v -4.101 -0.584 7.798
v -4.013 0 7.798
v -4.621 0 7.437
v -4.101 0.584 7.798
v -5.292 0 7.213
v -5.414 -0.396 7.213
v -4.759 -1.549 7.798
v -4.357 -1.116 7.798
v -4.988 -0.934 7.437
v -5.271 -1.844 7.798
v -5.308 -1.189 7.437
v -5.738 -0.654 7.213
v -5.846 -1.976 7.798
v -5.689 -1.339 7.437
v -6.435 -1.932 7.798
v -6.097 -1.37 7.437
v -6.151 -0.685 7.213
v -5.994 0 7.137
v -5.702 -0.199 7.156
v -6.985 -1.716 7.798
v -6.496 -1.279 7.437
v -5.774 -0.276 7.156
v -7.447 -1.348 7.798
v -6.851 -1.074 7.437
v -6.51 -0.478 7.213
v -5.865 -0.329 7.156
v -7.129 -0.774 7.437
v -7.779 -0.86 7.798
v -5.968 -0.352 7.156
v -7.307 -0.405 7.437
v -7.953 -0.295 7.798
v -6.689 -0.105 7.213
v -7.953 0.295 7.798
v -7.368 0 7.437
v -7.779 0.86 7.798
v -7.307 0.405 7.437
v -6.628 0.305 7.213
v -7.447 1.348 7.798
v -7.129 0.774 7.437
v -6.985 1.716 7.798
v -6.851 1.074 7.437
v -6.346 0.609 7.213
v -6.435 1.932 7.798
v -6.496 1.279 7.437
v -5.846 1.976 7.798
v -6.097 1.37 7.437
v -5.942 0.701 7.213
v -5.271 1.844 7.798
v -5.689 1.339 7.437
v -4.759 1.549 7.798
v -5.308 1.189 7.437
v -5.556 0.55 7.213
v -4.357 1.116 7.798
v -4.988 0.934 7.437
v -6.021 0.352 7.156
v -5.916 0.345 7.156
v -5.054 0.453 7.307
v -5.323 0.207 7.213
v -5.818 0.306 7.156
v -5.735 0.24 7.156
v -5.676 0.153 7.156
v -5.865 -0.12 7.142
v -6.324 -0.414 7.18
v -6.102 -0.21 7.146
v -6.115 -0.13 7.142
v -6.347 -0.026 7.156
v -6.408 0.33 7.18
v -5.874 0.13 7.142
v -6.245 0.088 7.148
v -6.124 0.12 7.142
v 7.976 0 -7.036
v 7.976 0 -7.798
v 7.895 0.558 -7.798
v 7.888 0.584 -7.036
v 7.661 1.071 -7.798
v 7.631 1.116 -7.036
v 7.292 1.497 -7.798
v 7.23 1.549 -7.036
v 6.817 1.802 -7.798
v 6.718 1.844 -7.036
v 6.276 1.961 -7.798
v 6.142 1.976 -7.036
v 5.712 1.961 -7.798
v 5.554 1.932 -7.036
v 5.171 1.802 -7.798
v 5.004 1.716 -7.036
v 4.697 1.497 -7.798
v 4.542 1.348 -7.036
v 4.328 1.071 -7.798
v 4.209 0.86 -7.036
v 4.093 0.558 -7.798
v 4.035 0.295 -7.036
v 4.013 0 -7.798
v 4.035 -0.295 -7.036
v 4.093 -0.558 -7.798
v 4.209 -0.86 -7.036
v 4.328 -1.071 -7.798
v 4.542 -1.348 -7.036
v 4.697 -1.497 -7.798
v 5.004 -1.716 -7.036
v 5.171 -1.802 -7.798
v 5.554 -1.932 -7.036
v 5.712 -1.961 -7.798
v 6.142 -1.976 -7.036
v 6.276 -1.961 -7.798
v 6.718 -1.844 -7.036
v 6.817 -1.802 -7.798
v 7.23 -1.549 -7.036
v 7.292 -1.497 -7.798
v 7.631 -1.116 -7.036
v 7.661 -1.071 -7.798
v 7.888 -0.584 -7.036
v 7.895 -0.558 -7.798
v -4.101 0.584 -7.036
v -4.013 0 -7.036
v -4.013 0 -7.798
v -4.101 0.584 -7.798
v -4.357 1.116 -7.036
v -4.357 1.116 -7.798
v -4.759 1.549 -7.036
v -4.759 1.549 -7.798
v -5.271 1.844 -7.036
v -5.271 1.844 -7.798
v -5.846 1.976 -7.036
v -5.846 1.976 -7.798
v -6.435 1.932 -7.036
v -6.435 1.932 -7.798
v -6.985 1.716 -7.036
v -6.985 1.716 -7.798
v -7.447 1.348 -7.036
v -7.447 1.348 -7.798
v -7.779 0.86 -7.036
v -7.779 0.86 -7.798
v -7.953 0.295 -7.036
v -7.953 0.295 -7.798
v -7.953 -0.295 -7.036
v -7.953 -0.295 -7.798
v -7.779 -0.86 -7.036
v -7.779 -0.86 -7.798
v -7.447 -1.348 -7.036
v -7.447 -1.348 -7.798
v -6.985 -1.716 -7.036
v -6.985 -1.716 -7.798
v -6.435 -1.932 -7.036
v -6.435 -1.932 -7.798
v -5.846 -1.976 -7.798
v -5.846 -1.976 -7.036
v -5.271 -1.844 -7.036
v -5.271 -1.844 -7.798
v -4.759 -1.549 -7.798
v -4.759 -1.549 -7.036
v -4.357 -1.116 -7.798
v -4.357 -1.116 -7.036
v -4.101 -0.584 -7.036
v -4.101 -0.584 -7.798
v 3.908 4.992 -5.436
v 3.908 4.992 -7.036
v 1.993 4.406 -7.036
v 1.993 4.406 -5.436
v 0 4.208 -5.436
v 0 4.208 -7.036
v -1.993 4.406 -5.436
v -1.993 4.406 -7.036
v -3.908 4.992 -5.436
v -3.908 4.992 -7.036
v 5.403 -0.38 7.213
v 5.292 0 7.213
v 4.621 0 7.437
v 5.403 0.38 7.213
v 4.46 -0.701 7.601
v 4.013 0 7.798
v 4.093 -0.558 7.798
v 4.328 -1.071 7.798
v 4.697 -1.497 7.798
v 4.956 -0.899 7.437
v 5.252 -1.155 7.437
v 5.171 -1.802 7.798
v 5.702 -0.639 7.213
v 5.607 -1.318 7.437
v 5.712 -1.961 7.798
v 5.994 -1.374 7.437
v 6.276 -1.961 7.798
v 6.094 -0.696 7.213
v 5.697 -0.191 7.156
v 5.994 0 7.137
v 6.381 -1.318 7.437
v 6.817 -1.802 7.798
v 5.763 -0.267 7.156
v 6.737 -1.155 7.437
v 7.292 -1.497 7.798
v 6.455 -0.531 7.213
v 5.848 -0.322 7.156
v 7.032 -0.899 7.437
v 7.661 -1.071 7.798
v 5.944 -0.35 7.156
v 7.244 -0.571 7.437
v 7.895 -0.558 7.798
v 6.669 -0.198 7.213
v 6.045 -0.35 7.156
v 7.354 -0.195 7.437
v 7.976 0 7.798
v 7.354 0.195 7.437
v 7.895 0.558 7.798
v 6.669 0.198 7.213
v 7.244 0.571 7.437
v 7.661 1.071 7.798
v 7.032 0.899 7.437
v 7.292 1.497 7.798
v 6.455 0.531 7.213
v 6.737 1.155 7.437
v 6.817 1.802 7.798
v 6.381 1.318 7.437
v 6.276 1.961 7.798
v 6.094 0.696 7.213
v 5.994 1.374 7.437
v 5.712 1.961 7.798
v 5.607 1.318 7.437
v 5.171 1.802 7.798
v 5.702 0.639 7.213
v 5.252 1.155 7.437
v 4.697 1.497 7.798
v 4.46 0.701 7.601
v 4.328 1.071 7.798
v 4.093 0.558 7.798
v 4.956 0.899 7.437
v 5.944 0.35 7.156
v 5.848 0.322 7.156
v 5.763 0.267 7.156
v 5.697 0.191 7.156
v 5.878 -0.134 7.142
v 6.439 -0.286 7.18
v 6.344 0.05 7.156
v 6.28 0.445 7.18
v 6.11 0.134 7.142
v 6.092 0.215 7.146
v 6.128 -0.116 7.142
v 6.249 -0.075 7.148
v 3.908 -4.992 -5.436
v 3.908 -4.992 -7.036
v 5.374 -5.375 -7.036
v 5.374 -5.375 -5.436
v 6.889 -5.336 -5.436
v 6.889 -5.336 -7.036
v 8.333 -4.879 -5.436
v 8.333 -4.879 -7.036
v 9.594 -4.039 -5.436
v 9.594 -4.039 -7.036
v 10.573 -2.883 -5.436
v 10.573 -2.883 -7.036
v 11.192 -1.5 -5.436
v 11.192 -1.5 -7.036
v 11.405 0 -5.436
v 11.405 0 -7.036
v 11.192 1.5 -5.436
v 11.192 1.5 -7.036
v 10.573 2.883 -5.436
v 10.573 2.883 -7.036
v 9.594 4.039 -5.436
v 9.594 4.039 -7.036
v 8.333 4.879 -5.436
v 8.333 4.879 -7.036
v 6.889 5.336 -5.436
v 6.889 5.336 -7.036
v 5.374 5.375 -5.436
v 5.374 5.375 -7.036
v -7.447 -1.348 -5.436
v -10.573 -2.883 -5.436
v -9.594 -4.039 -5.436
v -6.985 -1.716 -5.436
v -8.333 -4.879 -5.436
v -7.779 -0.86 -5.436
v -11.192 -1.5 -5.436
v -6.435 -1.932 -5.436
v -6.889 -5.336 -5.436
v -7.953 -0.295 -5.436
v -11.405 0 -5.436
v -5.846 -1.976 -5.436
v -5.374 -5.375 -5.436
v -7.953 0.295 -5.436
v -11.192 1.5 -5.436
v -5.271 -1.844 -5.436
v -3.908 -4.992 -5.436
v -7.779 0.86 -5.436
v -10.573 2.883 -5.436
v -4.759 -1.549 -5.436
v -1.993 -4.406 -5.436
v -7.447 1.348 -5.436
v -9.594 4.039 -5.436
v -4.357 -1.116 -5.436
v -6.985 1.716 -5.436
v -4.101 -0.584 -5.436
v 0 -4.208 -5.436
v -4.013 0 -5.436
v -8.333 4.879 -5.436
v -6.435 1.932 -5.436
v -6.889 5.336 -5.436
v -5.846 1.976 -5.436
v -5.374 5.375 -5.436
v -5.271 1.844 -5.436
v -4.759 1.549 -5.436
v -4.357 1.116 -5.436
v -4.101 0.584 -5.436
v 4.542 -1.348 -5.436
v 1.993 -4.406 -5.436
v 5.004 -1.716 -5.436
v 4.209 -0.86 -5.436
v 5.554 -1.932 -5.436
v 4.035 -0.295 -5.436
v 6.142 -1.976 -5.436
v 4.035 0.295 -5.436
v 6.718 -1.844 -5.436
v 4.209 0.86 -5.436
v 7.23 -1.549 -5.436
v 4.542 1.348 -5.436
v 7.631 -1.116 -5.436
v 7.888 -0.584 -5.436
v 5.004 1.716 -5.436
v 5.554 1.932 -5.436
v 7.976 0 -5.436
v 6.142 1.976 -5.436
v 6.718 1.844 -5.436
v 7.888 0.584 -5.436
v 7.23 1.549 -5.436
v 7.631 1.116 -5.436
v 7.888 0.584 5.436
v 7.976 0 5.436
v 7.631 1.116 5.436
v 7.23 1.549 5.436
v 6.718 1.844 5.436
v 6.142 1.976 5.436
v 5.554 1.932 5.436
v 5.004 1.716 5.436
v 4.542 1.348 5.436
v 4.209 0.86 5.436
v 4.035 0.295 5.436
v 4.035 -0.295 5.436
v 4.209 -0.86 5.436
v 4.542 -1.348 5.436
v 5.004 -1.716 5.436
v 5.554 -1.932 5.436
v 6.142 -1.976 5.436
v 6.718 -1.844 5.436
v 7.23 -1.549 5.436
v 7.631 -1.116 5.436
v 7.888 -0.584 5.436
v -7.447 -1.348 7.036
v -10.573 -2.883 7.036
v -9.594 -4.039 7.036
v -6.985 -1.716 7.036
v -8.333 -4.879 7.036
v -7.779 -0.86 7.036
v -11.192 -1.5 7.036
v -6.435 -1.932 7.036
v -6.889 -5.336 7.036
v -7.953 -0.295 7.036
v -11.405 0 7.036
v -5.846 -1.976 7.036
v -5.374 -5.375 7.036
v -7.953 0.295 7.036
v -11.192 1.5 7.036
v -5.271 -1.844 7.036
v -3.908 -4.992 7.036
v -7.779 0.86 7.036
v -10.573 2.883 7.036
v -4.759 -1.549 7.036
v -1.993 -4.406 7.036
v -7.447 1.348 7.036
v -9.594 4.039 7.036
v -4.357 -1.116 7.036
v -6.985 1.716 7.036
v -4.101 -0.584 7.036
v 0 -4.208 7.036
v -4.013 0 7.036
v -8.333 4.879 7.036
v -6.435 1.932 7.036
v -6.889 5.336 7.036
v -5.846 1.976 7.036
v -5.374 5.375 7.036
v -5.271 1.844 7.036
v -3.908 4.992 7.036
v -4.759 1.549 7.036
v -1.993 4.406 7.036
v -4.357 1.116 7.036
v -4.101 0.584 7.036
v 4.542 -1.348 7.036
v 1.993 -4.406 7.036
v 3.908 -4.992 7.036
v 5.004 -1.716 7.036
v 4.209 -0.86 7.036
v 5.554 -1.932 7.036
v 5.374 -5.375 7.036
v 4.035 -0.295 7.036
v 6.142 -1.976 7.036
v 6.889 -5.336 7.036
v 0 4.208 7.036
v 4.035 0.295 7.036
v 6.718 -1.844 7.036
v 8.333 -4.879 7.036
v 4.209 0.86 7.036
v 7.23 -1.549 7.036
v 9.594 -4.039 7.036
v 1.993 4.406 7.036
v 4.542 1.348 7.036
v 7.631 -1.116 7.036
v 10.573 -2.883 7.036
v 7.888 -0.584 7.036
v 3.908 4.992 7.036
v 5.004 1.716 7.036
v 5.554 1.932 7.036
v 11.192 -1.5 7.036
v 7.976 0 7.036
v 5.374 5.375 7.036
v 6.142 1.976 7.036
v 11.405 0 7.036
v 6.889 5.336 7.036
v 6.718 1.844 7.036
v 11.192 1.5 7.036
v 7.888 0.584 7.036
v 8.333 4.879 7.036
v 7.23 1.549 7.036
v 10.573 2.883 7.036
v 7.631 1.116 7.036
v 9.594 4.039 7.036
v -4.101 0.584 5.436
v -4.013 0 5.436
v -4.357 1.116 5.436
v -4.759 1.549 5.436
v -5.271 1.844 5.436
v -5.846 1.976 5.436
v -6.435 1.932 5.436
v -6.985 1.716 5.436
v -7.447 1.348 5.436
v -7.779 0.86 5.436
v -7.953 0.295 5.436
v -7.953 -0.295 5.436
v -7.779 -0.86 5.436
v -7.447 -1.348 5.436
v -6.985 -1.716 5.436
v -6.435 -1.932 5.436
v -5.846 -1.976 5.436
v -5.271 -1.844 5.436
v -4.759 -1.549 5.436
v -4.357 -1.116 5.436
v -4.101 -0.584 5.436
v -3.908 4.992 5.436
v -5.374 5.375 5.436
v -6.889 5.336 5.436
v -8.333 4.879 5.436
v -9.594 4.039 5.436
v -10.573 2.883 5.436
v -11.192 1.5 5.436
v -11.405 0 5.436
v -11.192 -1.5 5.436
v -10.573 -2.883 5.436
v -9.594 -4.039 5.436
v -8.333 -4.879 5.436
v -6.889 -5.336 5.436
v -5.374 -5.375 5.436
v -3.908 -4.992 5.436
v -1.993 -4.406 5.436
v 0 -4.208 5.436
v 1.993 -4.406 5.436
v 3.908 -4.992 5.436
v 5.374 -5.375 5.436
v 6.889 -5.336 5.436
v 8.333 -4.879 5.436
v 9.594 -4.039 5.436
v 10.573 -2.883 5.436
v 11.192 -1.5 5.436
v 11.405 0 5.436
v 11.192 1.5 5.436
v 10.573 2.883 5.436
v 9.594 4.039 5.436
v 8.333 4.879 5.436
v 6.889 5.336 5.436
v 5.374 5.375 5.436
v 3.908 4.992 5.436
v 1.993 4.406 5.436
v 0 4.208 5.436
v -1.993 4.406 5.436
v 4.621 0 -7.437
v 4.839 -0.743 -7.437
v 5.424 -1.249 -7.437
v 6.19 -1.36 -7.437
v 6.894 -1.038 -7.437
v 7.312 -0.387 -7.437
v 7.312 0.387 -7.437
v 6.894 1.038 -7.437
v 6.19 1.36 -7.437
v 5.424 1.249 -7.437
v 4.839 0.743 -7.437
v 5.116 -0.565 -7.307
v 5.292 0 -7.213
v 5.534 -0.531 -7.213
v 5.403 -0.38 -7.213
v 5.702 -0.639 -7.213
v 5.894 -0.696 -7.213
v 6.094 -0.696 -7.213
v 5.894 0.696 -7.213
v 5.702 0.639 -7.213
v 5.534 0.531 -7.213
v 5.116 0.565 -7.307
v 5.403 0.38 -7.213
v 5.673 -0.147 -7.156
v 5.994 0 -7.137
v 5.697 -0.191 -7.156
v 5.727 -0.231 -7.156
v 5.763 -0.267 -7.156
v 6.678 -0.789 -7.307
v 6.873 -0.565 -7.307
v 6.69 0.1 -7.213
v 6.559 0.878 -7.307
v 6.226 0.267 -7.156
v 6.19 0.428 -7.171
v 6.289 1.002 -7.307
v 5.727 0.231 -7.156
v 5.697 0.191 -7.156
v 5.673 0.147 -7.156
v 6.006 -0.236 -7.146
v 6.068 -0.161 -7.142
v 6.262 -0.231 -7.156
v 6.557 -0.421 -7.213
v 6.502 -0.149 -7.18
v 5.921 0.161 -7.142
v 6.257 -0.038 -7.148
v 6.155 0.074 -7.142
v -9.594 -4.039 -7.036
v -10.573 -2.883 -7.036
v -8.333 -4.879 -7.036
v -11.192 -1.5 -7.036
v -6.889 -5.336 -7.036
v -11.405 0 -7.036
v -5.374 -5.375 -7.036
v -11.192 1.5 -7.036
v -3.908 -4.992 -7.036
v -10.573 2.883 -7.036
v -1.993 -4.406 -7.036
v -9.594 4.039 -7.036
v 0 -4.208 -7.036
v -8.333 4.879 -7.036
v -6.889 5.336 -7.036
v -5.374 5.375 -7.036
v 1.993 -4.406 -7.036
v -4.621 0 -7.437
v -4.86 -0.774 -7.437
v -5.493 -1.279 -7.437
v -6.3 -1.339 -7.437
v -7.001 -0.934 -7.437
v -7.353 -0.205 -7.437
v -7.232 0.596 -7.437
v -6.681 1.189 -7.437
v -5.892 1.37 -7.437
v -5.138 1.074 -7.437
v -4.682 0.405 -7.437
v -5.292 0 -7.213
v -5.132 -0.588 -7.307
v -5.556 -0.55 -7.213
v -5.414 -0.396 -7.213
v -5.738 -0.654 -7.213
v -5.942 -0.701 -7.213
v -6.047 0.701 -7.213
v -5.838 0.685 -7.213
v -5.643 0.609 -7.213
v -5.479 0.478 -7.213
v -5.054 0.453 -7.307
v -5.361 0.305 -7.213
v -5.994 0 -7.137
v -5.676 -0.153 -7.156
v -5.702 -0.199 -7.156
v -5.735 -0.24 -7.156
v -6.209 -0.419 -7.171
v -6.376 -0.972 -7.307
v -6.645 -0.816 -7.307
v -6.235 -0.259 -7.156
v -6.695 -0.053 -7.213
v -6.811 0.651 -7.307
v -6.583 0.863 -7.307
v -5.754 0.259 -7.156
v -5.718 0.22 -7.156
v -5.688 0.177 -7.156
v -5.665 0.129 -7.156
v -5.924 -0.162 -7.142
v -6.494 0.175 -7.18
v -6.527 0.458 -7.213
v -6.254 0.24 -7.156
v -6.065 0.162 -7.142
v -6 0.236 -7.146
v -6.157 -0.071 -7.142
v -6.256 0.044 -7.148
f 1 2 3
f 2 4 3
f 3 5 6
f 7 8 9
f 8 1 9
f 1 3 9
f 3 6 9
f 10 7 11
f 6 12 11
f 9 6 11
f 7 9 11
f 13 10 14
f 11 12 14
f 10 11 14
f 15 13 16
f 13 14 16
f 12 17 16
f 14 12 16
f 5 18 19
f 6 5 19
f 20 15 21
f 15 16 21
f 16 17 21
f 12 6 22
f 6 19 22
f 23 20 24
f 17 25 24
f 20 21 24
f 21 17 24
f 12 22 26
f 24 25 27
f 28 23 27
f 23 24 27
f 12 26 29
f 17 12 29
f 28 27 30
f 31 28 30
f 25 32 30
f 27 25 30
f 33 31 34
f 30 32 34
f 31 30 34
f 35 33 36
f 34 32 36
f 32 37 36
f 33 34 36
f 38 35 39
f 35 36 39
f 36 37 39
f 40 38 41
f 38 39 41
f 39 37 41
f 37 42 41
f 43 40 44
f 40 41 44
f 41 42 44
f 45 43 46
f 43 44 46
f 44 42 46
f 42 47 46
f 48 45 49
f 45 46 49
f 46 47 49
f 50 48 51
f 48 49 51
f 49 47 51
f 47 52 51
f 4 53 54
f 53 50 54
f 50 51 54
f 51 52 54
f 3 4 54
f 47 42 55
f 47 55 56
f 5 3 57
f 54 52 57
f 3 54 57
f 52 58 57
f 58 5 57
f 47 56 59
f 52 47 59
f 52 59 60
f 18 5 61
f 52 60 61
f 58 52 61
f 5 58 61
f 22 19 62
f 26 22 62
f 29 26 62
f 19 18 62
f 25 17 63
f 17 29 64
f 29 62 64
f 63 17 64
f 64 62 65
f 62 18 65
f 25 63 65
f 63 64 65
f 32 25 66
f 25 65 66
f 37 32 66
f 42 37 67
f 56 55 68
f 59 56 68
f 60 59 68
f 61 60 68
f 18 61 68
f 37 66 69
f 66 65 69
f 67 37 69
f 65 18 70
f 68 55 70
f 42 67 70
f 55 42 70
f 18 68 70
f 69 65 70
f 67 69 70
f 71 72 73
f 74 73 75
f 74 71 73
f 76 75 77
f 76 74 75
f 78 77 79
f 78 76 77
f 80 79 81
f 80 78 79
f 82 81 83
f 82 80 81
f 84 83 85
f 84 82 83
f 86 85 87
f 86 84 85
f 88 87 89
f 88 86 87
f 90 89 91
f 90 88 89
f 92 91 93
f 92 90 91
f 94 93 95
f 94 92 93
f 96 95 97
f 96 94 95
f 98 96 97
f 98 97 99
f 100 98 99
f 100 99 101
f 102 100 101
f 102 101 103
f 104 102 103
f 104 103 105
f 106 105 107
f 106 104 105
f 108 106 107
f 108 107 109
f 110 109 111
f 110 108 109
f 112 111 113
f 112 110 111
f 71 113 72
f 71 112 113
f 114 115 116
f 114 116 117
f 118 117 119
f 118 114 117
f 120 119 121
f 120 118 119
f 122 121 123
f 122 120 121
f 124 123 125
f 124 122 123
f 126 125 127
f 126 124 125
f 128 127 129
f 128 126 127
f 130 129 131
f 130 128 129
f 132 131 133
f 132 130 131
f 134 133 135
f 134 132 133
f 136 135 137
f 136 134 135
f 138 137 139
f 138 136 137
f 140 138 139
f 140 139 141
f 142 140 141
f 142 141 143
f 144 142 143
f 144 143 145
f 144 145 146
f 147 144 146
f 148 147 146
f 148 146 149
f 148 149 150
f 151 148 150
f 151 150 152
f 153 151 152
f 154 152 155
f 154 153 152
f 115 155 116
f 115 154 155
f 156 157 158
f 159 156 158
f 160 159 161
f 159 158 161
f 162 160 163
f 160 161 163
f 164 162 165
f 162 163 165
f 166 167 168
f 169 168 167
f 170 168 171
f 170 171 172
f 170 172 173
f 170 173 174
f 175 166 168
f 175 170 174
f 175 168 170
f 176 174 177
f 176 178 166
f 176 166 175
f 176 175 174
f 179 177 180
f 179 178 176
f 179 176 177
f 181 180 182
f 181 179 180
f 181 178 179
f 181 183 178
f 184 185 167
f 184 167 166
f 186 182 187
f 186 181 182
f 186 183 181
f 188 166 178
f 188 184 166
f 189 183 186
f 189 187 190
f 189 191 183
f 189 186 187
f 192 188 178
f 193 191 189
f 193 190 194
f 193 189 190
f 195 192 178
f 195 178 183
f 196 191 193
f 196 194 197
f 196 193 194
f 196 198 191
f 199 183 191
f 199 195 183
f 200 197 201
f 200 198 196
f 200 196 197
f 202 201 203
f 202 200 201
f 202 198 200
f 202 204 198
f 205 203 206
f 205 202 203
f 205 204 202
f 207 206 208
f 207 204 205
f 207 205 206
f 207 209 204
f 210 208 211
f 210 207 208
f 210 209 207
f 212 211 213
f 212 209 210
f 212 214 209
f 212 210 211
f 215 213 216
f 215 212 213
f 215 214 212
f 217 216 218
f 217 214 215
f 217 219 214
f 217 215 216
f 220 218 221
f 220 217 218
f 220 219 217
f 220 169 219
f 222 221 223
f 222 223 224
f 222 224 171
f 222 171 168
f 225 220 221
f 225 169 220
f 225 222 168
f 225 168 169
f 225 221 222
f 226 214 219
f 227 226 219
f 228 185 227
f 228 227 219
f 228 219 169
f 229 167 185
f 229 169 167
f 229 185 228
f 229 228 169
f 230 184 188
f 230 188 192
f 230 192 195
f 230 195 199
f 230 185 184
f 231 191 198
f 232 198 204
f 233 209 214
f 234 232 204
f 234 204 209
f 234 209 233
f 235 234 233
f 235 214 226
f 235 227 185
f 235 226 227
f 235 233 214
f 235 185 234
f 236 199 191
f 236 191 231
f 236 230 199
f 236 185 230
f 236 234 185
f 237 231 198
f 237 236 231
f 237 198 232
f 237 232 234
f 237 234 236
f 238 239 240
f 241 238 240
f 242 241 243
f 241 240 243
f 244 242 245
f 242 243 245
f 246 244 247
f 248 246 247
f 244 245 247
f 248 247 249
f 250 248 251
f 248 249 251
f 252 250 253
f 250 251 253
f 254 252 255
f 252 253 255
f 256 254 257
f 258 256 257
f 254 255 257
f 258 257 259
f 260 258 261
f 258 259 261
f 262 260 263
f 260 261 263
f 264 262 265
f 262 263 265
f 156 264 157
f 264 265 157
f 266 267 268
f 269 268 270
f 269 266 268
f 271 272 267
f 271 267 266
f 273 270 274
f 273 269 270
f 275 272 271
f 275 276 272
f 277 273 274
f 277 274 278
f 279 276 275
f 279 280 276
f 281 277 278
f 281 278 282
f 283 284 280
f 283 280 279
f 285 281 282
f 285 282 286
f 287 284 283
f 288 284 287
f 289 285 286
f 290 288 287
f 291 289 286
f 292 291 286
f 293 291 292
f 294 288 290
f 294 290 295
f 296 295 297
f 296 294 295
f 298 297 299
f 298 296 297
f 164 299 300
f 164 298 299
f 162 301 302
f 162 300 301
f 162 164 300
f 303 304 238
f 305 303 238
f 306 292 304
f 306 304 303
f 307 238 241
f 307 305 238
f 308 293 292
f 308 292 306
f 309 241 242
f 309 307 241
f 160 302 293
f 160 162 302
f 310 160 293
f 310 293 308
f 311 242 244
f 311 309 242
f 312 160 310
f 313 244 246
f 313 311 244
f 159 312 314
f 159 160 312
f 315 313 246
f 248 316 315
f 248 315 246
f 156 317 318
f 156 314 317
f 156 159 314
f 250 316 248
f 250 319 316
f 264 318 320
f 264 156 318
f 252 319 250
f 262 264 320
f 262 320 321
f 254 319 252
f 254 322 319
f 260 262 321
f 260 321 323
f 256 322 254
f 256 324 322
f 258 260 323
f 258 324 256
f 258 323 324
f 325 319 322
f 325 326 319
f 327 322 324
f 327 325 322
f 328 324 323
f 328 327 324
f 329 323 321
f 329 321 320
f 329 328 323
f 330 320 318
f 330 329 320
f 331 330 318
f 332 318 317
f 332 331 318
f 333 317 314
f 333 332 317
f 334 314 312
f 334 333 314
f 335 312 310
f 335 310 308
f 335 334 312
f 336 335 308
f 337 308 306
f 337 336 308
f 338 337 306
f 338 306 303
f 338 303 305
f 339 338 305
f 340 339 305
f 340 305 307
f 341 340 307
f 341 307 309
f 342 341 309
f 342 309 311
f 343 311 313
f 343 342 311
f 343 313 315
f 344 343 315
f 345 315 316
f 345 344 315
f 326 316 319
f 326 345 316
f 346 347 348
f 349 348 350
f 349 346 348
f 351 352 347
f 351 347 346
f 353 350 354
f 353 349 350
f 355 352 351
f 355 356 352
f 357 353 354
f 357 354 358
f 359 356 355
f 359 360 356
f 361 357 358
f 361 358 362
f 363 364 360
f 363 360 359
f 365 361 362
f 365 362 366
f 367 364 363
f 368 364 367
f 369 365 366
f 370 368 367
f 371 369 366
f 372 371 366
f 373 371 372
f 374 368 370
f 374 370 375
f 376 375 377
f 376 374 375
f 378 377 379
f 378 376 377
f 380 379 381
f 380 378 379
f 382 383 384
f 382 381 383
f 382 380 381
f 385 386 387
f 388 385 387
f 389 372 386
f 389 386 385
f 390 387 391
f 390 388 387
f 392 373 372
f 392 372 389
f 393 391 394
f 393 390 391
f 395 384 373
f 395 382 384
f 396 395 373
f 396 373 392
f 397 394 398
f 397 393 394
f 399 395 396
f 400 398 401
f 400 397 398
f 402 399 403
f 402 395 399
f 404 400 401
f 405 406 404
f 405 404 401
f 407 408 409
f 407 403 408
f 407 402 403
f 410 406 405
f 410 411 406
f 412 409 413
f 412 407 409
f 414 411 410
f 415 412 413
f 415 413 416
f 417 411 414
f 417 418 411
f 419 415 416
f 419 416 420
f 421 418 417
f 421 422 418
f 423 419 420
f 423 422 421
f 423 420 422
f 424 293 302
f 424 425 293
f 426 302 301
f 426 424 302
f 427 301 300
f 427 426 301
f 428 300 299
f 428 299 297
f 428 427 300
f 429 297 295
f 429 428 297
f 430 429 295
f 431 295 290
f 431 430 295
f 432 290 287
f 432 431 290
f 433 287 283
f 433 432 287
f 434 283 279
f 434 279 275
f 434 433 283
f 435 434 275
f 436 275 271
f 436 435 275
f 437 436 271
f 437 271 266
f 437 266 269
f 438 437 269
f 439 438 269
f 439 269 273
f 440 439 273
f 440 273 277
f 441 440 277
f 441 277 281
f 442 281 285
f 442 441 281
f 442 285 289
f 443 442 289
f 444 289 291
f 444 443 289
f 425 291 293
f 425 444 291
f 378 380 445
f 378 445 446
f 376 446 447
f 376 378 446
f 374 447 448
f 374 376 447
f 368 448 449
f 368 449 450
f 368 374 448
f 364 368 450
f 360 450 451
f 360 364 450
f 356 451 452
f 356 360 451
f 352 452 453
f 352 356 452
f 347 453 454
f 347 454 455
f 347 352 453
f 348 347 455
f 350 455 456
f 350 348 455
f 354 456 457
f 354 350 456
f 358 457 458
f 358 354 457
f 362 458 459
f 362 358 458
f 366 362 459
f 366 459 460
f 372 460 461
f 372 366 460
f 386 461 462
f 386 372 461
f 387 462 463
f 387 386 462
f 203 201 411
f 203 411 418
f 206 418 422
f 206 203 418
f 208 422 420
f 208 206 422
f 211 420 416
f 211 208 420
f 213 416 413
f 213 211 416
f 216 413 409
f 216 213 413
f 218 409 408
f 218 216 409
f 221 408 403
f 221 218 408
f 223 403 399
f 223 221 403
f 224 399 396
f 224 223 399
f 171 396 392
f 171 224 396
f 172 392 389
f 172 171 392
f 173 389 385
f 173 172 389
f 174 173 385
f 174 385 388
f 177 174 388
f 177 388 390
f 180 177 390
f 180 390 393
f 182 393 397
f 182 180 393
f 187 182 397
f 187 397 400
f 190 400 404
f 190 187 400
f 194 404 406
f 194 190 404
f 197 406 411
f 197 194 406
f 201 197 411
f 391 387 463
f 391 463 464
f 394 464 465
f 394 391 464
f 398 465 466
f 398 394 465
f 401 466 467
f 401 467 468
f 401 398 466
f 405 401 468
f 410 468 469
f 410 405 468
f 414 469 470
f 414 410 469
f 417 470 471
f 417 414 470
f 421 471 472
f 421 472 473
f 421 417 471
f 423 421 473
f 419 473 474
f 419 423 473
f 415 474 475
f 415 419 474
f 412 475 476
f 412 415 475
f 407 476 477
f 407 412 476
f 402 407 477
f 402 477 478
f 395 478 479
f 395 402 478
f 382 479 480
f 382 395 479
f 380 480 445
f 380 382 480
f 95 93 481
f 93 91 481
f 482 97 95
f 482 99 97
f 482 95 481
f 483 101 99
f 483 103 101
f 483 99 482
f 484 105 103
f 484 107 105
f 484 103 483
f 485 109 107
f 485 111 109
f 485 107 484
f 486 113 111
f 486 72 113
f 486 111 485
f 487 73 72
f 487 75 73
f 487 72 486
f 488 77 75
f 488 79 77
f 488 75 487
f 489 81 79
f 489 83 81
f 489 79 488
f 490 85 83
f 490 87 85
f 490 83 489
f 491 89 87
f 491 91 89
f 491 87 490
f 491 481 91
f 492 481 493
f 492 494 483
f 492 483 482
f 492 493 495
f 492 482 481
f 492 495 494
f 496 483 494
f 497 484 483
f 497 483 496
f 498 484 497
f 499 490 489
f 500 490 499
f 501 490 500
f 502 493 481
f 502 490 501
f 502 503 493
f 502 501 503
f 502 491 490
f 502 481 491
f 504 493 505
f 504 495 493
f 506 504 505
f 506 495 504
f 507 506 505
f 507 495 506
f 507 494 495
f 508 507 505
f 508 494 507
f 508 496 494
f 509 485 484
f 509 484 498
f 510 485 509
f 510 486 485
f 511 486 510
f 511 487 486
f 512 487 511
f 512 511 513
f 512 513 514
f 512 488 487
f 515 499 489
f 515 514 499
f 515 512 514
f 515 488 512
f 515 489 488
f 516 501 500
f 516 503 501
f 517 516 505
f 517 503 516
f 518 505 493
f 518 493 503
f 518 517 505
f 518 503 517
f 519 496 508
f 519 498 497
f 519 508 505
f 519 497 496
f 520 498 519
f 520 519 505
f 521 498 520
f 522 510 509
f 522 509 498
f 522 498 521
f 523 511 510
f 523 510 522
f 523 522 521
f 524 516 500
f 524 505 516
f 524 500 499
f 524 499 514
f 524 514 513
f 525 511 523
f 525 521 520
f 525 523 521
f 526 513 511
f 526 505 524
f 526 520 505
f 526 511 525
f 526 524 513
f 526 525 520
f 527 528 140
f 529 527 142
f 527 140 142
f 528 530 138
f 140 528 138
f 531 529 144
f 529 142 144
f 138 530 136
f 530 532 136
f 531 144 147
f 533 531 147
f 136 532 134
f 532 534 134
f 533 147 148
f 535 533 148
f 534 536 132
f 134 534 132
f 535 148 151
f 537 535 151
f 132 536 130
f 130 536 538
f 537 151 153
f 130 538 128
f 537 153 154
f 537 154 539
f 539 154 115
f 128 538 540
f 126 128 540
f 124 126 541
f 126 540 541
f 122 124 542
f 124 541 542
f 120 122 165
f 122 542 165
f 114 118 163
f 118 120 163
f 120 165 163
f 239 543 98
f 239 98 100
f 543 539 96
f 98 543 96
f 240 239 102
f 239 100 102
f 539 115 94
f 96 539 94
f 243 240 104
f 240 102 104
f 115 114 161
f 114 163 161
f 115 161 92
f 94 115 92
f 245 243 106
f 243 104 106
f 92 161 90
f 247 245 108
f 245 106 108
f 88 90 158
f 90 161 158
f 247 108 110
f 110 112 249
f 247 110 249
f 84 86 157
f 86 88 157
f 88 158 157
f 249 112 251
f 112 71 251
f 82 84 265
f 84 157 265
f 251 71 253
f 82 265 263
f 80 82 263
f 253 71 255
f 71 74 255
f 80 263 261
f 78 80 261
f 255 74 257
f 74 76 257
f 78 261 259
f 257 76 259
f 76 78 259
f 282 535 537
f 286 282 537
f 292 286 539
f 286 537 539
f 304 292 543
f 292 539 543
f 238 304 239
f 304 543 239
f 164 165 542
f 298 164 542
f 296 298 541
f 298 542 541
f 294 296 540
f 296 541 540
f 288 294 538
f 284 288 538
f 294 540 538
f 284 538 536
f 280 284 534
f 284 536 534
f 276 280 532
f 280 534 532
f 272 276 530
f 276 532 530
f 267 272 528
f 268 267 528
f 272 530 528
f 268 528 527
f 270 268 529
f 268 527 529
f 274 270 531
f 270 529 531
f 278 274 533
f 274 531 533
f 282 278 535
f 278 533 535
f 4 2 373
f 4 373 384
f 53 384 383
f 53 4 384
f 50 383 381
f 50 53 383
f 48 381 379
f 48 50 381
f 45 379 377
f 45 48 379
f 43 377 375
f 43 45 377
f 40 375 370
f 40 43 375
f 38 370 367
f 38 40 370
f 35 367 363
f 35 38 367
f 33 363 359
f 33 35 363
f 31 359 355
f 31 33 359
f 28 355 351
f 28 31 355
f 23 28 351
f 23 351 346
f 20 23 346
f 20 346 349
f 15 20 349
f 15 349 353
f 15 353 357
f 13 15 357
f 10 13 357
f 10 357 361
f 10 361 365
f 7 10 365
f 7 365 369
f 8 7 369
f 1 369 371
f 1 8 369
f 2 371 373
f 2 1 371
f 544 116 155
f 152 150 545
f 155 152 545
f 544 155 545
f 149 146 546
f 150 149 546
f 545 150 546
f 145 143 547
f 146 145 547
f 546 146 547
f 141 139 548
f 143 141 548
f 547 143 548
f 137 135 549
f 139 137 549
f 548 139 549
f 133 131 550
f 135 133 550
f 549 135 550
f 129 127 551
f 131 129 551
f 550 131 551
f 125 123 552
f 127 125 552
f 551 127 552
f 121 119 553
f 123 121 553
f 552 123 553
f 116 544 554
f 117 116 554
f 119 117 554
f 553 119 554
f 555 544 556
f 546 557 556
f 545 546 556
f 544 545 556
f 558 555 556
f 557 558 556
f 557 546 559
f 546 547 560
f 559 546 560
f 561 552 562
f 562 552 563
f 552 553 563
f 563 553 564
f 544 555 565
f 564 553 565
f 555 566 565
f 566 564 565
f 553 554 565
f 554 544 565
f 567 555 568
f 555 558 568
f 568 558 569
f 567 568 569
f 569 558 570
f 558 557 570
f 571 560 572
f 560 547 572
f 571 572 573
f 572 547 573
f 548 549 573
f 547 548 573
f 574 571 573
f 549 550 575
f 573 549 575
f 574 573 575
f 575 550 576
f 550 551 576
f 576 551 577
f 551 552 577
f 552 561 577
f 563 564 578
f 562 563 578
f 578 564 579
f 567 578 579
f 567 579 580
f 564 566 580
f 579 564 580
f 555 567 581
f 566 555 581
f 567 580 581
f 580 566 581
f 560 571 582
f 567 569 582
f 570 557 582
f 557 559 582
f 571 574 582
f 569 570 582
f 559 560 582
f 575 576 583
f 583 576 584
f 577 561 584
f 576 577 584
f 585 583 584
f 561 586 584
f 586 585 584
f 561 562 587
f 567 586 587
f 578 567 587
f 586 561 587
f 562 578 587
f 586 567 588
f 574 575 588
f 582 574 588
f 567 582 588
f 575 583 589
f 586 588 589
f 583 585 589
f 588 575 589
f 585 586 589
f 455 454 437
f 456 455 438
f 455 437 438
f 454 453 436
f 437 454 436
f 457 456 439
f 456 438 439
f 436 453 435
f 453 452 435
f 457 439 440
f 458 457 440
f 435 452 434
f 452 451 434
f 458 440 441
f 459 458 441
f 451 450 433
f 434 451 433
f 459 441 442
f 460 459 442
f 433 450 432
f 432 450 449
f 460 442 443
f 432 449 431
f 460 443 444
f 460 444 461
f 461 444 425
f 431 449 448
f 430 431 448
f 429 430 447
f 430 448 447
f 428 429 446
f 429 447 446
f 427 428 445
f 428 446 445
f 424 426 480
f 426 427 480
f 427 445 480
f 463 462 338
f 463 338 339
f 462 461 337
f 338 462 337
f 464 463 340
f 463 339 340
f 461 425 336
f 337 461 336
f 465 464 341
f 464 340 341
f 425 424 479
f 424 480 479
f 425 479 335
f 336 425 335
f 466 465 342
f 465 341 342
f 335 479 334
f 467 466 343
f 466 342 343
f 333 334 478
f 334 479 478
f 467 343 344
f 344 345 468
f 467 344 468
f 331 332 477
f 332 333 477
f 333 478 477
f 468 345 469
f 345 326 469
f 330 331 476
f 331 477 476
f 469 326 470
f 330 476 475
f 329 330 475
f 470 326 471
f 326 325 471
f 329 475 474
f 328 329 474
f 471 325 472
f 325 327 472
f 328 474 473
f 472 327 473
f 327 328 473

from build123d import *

# Parameters (mm, degrees)
SKETCH3_R             = 1.9812
BOSS_EXTRUDE1_DEPTH   = 7.7978
BOSS_EXTRUDE1_2_DEPTH = 7.7978
BOSS_EXTRUDE2_DEPTH   = 1.6002


with BuildPart() as part:
    # Sketch3 → Boss-Extrude1 (new body, symmetric)
    with BuildSketch(Plane.XY):
        with Locations((-5.9944, 0)):
            Circle(SKETCH3_R)
    extrude(amount=BOSS_EXTRUDE1_DEPTH, both=True)



with BuildPart() as body_2:
    # Sketch3 → Boss-Extrude1 2 (new body, symmetric)
    with BuildSketch(Plane.XY):
        with Locations((5.9944, 0)):
            Circle(SKETCH3_R)
    extrude(amount=BOSS_EXTRUDE1_2_DEPTH, both=True)


with BuildPart() as part_1:
    add(part.part)

    add(body_2.part)  # Boss-Extrude2 merges body 2
    # Sketch4 → Boss-Extrude2 (add)
    with BuildSketch(Plane.XY.offset(7.0358)):
        with BuildLine():
            ThreePointArc((-3.908114, 4.991761), (-11.4046, 0), (-3.908114, -4.991761))
            ThreePointArc((-3.908114, -4.991761), (0, -4.207923), (3.908114, -4.991761))
            ThreePointArc((3.908114, -4.991761), (11.4046, 0), (3.908114, 4.991761))
            ThreePointArc((3.908114, 4.991761), (0, 4.207923), (-3.908114, 4.991761))
        make_face()
    boss_extrude2 = extrude(amount=-BOSS_EXTRUDE2_DEPTH)

    # Mirror1: Boss-Extrude2 across plane
    add(boss_extrude2.mirror(Plane.XY))

    # Sketch5 → Cut-Revolve1 (revolve, cut)
    with BuildSketch(Plane(origin=(0, 0, 0), x_dir=(1, 0, 0), z_dir=(0, 1, 0))):
        with BuildLine():
            Line((-5.9944, 7.7978), (-5.9944, 7.1374))
            ThreePointArc((-5.9944, 7.1374), (-4.950216, 7.306848), (-4.0132, 7.7978))
            Line((-4.0132, 7.7978), (-5.9944, 7.7978))
        make_face()
        with BuildLine():
            Line((-5.9944, -7.1374), (-5.9944, -7.7978))
            Line((-5.9944, -7.7978), (-4.0132, -7.7978))
            ThreePointArc((-4.0132, -7.7978), (-4.950216, -7.306848), (-5.9944, -7.1374))
        make_face()
    cut_revolve1 = revolve(axis=Axis((-5.9944, 0, 7.7978), (0, 0, -1)), mode=Mode.SUBTRACT)

    # Mirror2: Cut-Revolve1 across plane
    add(cut_revolve1.mirror(Plane(origin=(0, 0, 0), x_dir=(0, 0, 1), z_dir=(1, 0, 0))), mode=Mode.SUBTRACT)


solid = part_1.part
